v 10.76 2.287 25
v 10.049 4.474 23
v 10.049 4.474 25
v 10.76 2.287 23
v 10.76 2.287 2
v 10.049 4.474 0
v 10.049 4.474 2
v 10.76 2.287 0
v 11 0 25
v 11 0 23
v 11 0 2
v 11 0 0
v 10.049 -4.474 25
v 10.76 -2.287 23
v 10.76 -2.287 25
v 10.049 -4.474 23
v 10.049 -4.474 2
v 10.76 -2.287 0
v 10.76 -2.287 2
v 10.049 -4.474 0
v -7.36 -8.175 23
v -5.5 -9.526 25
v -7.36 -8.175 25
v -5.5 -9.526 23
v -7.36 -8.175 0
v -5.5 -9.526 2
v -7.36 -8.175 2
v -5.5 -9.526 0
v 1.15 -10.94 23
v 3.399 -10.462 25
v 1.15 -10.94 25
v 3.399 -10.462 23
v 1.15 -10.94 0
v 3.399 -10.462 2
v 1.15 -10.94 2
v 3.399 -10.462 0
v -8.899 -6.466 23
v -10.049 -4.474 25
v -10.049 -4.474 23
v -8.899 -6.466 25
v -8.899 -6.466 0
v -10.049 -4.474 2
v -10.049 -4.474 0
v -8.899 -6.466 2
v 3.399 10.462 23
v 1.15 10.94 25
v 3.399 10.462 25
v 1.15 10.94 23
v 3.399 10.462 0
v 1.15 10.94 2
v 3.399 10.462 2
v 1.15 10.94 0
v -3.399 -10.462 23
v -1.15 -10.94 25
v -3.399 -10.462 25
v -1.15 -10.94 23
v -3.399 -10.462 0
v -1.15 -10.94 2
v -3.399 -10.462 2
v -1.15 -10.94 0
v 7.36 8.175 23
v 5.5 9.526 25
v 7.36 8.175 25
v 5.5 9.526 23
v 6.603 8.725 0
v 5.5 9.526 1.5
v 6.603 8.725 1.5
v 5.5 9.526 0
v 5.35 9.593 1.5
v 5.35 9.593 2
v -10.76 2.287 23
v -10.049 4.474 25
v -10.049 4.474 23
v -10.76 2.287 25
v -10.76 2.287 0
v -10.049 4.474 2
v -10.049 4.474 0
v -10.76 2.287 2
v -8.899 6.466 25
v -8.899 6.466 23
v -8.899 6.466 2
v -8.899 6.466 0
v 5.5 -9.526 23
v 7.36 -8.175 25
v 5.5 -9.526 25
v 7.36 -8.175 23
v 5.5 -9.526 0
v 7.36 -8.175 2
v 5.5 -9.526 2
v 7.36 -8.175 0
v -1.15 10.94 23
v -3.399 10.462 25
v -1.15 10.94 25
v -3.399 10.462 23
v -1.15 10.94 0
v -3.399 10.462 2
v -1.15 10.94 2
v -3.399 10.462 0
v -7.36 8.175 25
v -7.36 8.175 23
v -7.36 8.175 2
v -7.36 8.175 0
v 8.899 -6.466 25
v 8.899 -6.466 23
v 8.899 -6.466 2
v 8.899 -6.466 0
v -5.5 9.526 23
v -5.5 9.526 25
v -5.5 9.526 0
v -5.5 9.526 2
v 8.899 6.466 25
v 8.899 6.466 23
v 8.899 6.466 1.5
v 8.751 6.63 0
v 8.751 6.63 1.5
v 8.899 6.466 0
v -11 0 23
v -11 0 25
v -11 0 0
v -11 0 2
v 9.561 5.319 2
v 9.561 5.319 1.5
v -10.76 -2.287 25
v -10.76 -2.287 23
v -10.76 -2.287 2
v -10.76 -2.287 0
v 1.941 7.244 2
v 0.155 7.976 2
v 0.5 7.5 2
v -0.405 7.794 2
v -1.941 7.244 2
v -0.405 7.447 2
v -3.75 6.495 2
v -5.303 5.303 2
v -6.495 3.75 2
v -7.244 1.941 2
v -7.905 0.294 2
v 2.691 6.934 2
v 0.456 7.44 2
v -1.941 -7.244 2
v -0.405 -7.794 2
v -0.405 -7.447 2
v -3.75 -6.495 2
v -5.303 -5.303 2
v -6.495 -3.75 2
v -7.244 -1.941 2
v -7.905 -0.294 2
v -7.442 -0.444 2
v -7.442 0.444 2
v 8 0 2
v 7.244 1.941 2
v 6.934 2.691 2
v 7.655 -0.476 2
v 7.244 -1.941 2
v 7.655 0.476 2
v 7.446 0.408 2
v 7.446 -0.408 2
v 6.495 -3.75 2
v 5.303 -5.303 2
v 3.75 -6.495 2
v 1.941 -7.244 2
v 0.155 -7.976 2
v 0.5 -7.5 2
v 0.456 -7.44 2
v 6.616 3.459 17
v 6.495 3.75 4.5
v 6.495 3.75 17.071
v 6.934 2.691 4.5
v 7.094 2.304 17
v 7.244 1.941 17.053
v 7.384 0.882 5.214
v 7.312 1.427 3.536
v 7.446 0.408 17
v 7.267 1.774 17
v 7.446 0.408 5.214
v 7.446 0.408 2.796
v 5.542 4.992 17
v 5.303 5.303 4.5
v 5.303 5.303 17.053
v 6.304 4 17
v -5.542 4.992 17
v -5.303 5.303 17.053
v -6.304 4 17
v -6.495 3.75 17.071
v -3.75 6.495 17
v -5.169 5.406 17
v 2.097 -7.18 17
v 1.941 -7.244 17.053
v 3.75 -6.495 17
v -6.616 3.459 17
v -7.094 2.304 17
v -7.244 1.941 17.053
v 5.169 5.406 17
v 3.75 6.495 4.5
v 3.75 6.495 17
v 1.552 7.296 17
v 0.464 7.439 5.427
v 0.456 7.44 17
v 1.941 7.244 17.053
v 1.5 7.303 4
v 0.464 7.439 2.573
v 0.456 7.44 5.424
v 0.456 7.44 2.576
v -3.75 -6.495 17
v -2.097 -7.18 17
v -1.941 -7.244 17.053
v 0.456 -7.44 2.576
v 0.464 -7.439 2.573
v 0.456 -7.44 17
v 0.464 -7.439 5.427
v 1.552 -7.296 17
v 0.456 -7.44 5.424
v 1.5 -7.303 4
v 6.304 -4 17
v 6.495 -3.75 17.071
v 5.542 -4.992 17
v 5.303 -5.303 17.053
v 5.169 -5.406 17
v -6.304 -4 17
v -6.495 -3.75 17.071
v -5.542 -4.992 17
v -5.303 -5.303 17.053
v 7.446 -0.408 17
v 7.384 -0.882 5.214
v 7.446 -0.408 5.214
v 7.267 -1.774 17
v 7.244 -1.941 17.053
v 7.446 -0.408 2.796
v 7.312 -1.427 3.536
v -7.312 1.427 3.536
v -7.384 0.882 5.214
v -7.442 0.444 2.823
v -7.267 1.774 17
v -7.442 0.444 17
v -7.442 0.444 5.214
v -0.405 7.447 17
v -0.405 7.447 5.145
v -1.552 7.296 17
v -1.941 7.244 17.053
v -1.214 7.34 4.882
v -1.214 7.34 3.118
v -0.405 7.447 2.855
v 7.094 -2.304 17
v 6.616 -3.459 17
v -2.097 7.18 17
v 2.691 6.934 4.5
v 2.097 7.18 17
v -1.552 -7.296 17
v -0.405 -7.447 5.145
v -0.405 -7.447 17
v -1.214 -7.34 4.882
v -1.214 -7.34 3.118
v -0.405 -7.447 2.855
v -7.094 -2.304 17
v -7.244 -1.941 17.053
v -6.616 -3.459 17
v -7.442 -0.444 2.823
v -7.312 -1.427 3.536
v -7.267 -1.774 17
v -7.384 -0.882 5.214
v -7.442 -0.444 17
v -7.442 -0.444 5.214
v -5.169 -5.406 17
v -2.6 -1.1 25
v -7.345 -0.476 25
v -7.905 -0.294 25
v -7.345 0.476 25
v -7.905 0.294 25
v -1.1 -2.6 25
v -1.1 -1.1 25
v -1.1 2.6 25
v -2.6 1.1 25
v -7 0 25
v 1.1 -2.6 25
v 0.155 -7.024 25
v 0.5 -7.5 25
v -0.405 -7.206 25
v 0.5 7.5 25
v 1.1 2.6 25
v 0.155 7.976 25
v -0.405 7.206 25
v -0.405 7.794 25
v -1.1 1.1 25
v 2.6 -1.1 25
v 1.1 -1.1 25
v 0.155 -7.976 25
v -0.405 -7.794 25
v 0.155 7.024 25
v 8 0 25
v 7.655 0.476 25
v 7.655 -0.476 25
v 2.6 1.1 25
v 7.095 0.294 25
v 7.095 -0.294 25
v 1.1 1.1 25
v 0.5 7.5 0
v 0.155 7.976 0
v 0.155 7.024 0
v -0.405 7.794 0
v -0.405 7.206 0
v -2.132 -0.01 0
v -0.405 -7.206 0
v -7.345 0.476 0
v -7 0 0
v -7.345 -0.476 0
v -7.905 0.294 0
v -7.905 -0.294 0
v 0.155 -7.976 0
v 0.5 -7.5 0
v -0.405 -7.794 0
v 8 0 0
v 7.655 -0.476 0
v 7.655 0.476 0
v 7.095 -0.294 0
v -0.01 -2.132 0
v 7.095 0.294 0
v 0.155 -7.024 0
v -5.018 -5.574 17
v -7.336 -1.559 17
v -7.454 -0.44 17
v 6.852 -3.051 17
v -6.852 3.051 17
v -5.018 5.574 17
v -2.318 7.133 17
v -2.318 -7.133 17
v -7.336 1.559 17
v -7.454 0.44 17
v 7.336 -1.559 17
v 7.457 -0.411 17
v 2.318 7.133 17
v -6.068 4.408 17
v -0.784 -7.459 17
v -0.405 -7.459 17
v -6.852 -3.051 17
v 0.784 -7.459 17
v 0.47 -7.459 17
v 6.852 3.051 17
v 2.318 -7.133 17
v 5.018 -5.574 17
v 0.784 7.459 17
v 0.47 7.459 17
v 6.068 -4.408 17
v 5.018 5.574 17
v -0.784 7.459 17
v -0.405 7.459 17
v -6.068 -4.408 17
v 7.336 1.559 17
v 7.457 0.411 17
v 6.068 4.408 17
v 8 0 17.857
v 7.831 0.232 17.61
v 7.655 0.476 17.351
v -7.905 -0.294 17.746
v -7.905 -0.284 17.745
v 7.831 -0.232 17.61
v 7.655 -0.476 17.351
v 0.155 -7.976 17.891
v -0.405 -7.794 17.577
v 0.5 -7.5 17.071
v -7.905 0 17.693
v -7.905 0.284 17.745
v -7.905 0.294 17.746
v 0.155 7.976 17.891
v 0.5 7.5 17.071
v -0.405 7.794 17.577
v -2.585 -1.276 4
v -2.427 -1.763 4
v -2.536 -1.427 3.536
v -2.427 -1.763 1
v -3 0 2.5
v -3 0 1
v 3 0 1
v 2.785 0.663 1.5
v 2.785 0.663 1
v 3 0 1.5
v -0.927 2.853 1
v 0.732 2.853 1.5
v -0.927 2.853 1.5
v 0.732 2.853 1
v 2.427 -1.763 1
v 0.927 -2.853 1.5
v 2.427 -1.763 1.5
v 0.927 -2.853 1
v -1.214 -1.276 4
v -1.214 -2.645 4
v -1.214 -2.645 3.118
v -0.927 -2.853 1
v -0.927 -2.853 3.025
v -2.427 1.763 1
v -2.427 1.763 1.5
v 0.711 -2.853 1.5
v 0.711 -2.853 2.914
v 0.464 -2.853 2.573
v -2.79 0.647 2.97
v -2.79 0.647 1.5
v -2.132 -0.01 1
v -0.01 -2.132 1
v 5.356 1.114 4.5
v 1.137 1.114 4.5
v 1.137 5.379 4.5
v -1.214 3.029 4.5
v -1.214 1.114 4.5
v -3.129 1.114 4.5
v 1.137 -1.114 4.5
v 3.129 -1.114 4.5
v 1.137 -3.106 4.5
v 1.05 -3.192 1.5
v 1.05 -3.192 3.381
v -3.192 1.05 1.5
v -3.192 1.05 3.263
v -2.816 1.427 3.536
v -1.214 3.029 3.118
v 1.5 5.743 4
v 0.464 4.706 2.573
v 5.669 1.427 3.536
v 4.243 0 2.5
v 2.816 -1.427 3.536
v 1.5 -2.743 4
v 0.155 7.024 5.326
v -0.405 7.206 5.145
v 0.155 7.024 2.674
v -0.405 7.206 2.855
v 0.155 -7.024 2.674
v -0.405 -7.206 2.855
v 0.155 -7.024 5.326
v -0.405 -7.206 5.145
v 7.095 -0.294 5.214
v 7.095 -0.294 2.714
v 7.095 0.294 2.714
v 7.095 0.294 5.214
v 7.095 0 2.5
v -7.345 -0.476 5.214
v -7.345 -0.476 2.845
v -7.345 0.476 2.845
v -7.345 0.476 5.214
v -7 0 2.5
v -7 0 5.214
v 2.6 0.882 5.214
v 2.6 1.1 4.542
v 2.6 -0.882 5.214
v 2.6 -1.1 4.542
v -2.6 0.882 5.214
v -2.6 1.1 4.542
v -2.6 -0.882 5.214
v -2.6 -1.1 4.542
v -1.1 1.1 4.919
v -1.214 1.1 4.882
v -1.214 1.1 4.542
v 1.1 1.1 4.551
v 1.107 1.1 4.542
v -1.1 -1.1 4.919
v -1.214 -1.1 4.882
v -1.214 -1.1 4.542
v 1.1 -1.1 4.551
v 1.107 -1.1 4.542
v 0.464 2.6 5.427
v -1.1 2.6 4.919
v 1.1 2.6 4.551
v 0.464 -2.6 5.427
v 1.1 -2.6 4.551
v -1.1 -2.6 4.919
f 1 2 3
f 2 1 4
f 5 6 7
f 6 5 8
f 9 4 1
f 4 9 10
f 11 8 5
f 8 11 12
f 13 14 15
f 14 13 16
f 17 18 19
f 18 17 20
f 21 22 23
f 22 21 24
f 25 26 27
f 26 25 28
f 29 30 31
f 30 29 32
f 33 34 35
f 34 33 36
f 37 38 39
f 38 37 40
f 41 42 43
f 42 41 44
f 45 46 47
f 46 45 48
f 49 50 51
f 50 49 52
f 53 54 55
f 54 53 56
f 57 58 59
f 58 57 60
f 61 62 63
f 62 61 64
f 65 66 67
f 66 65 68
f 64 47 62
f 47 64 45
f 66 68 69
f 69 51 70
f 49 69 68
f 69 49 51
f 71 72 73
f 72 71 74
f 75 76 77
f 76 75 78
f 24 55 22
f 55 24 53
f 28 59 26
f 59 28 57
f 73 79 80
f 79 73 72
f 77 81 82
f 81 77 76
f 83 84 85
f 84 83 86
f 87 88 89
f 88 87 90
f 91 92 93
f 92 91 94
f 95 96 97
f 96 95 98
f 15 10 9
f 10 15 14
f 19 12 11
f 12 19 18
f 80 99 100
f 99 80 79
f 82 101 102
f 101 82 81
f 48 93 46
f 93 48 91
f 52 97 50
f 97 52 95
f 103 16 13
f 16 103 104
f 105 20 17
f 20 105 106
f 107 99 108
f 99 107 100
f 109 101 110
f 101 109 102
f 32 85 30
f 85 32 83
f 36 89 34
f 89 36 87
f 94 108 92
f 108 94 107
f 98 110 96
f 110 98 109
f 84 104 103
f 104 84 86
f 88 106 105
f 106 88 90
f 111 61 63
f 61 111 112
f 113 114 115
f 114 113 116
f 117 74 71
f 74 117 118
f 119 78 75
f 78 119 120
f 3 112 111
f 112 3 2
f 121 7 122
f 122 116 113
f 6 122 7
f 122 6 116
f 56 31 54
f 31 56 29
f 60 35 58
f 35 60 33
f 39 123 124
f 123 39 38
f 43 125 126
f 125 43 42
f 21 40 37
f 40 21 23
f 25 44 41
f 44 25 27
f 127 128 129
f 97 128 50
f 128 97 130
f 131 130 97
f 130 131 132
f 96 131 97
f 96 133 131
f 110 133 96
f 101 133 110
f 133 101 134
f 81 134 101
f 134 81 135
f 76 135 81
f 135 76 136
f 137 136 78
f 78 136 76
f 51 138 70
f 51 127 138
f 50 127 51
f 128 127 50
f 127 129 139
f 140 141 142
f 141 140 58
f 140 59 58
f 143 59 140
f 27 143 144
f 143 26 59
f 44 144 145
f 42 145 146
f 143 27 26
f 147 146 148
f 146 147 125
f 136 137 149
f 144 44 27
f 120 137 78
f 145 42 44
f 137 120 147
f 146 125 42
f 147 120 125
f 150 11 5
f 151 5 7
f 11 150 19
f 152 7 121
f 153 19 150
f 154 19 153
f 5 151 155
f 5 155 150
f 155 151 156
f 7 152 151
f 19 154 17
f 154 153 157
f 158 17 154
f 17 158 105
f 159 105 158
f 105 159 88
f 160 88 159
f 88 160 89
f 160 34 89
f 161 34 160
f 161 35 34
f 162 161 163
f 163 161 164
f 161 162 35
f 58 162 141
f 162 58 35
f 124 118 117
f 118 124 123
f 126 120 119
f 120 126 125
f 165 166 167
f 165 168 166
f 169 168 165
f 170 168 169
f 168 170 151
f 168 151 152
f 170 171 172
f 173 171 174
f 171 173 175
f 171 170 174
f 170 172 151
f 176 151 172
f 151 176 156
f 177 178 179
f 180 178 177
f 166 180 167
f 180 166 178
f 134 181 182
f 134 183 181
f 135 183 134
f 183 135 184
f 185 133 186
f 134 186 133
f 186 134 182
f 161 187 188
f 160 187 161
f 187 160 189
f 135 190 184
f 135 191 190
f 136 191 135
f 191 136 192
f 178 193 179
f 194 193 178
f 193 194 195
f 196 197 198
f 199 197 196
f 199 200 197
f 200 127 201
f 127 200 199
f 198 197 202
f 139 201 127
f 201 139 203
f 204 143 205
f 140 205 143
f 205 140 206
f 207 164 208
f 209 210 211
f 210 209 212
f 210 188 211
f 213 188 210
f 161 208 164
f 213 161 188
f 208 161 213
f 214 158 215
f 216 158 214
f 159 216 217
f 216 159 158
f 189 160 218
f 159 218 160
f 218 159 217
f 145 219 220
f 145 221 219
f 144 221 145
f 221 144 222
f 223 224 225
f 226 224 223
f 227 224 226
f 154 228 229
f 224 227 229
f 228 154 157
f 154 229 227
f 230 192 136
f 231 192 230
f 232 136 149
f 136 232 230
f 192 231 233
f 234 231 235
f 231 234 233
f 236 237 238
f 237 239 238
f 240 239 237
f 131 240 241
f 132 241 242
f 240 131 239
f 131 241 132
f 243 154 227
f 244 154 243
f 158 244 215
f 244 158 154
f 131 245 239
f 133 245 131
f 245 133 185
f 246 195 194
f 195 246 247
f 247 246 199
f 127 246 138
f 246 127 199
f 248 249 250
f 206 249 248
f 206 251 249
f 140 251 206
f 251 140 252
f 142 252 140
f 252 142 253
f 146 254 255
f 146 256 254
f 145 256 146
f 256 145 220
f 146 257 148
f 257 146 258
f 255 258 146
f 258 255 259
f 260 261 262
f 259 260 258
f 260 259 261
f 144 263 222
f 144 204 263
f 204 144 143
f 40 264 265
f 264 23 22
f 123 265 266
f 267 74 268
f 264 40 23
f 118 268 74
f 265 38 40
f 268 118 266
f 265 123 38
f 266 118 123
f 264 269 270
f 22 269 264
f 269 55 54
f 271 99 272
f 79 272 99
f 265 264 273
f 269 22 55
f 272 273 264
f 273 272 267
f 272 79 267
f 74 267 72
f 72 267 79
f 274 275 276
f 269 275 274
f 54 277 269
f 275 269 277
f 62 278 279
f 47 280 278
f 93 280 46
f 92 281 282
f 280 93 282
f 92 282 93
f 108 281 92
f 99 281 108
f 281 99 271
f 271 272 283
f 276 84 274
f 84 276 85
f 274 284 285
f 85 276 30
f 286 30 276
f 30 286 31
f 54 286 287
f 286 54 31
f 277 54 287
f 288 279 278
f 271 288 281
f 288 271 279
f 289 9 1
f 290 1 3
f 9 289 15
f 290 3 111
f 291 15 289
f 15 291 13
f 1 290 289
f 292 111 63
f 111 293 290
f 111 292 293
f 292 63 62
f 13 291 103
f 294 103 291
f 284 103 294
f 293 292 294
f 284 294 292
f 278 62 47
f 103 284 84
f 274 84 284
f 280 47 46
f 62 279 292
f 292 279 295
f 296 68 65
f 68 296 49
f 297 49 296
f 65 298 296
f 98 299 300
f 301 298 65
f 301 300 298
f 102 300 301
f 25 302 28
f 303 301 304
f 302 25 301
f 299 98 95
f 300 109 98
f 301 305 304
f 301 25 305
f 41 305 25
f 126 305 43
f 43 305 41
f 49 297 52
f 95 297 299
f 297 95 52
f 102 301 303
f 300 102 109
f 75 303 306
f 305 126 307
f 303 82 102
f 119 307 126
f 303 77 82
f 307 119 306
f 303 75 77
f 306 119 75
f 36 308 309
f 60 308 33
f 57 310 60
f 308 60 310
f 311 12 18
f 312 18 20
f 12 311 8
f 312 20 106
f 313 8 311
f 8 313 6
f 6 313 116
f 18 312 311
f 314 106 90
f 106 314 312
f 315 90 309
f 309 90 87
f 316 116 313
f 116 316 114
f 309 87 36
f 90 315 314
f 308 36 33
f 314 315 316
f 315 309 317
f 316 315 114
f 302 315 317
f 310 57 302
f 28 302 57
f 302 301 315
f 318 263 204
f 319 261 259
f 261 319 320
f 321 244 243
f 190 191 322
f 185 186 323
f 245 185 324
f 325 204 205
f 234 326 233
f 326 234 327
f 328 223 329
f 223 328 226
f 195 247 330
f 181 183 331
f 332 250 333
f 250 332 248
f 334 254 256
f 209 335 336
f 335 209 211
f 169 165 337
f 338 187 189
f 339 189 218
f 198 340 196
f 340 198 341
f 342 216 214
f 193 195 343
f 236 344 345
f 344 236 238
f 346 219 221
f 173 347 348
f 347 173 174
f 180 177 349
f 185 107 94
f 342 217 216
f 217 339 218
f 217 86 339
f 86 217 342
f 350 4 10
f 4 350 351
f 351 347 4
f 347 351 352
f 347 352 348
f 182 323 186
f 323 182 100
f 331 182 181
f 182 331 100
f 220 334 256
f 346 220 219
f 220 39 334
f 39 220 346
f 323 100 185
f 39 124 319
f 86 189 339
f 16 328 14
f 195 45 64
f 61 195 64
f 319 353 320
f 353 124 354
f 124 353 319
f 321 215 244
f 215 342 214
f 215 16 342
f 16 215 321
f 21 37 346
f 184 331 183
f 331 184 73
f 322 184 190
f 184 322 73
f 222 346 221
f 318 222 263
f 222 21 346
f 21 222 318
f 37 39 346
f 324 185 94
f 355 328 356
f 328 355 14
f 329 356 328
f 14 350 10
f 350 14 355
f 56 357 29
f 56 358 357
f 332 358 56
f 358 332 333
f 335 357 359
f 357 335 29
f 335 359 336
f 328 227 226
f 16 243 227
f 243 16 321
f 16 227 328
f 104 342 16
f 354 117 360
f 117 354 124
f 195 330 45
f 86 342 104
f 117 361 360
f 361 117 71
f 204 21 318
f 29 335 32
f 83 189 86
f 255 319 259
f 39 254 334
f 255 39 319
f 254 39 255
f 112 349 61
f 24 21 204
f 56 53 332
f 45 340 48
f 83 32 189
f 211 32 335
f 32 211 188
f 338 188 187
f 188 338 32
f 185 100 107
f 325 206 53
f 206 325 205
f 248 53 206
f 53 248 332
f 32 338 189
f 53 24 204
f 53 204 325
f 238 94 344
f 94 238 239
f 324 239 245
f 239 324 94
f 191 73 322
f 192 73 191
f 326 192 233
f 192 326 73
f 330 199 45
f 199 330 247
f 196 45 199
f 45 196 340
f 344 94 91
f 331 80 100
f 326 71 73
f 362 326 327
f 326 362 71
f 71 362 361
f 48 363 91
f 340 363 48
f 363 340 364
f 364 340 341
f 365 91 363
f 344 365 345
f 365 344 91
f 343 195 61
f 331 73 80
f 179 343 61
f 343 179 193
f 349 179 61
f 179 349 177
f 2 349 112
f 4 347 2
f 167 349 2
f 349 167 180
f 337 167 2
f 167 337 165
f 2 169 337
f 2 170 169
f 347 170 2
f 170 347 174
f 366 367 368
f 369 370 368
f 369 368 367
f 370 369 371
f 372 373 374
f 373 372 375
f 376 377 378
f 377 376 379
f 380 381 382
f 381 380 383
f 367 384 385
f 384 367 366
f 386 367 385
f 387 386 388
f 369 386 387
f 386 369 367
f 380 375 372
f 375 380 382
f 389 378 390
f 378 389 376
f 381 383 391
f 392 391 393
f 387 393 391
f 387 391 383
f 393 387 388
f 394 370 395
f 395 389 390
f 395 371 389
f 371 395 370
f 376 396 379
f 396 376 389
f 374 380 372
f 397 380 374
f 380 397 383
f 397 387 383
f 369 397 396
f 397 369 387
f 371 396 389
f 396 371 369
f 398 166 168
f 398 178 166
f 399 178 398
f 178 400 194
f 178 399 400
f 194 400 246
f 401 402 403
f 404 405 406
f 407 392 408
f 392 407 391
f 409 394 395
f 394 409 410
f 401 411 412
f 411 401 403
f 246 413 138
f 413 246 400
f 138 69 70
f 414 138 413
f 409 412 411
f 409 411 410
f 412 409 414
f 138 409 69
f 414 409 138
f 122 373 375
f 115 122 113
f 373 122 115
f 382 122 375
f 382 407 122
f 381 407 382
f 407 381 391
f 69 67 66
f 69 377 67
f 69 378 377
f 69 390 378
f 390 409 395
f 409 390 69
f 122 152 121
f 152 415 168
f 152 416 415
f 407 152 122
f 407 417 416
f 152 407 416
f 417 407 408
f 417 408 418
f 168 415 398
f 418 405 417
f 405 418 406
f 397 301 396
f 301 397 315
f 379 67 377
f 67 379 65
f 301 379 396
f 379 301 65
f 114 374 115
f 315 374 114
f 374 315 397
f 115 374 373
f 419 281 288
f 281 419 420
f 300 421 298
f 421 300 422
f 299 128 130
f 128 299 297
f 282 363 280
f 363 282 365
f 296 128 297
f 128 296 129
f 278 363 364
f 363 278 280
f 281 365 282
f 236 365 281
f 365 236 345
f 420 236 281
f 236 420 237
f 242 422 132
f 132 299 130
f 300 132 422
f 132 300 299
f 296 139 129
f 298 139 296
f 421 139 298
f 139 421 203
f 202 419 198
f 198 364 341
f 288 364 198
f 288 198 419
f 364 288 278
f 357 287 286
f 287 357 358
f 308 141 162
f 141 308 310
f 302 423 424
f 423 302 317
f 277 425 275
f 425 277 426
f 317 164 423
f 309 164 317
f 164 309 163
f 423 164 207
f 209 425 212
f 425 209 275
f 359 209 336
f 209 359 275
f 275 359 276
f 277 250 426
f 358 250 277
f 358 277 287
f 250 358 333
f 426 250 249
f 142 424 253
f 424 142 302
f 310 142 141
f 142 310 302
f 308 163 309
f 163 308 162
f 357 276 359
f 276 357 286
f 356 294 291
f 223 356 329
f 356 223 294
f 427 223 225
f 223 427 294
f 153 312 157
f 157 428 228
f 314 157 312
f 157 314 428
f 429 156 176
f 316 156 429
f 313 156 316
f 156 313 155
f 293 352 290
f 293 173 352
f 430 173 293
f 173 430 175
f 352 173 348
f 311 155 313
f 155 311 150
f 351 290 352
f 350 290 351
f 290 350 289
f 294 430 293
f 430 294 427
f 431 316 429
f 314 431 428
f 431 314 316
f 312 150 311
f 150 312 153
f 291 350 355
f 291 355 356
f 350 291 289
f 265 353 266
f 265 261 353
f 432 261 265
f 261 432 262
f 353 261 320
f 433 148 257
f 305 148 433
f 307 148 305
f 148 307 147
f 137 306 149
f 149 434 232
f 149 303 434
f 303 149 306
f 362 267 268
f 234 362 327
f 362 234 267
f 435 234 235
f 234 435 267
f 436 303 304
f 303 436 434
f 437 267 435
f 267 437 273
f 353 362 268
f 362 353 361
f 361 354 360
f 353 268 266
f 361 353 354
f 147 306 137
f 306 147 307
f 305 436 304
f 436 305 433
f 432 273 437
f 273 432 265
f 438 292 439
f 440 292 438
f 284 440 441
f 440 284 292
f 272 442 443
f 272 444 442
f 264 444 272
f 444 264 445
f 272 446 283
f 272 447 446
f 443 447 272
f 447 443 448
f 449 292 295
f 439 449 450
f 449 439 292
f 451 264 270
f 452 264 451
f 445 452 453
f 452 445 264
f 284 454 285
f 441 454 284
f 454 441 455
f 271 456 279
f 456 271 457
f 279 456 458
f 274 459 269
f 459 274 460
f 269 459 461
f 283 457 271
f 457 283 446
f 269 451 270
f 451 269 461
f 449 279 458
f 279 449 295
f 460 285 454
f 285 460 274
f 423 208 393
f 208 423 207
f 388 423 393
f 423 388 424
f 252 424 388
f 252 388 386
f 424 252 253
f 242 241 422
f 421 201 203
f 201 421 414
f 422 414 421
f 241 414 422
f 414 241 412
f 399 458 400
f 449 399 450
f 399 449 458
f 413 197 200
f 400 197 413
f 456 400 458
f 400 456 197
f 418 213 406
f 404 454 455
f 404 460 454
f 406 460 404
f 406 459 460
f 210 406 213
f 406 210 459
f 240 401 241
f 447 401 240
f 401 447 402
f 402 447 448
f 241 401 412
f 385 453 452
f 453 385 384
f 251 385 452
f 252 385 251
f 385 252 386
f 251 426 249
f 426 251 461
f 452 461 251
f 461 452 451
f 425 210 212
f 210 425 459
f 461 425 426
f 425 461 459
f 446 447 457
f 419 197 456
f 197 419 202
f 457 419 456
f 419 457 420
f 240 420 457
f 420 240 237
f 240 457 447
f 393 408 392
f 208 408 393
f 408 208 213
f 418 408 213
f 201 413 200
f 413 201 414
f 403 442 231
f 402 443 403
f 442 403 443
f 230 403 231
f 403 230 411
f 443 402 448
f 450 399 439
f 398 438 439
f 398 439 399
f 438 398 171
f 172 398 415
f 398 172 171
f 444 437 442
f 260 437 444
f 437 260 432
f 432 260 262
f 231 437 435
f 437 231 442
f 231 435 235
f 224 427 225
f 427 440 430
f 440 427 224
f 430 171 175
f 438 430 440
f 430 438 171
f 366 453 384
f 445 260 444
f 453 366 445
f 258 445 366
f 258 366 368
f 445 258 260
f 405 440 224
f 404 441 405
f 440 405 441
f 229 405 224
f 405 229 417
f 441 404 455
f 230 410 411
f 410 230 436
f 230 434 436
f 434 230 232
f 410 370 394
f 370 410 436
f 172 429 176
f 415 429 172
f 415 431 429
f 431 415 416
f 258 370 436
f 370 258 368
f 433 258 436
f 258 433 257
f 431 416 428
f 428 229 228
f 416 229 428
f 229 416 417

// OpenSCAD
difference() {
    union() {
        difference() {
        cylinder(25,d=22);
        difference() {
        translate([0,0,2])cylinder(21,d=22);
        translate([0,0,2])cylinder(21,d=15);
        }
    }
    translate([0,0,17])cylinder(6,d1=15, d2=22);
}
    translate([0,0,1])cylinder(3,d=6);
    translate([6,6,3])rotate([0,0,45]) cube([20,6,3],true);
    translate([6,6,0])rotate([0,0,45]) cube([20,3,3],true);
    cylinder(5,d=3);
    translate([0,7.5,0])cylinder(25,d=1);
    translate([0,-7.5,0])cylinder(25,d=1);
    translate([7.5,0,0])cylinder(25,d=1);
    translate([-7.5,0,0])cylinder(25,d=1);
    translate([-2.6,-1.1,2]) cube([5.2,2.2,30]);
    rotate([0,0,90]) translate([-2.6,-1.1,2]) cube([5.2,2.2,30]);
    rotate([90,0,0]) translate([0,4,-20])cylinder(40,d=3);
    rotate([0,90,0]) translate([-4,0,-20])cylinder(40,d=3);
}
